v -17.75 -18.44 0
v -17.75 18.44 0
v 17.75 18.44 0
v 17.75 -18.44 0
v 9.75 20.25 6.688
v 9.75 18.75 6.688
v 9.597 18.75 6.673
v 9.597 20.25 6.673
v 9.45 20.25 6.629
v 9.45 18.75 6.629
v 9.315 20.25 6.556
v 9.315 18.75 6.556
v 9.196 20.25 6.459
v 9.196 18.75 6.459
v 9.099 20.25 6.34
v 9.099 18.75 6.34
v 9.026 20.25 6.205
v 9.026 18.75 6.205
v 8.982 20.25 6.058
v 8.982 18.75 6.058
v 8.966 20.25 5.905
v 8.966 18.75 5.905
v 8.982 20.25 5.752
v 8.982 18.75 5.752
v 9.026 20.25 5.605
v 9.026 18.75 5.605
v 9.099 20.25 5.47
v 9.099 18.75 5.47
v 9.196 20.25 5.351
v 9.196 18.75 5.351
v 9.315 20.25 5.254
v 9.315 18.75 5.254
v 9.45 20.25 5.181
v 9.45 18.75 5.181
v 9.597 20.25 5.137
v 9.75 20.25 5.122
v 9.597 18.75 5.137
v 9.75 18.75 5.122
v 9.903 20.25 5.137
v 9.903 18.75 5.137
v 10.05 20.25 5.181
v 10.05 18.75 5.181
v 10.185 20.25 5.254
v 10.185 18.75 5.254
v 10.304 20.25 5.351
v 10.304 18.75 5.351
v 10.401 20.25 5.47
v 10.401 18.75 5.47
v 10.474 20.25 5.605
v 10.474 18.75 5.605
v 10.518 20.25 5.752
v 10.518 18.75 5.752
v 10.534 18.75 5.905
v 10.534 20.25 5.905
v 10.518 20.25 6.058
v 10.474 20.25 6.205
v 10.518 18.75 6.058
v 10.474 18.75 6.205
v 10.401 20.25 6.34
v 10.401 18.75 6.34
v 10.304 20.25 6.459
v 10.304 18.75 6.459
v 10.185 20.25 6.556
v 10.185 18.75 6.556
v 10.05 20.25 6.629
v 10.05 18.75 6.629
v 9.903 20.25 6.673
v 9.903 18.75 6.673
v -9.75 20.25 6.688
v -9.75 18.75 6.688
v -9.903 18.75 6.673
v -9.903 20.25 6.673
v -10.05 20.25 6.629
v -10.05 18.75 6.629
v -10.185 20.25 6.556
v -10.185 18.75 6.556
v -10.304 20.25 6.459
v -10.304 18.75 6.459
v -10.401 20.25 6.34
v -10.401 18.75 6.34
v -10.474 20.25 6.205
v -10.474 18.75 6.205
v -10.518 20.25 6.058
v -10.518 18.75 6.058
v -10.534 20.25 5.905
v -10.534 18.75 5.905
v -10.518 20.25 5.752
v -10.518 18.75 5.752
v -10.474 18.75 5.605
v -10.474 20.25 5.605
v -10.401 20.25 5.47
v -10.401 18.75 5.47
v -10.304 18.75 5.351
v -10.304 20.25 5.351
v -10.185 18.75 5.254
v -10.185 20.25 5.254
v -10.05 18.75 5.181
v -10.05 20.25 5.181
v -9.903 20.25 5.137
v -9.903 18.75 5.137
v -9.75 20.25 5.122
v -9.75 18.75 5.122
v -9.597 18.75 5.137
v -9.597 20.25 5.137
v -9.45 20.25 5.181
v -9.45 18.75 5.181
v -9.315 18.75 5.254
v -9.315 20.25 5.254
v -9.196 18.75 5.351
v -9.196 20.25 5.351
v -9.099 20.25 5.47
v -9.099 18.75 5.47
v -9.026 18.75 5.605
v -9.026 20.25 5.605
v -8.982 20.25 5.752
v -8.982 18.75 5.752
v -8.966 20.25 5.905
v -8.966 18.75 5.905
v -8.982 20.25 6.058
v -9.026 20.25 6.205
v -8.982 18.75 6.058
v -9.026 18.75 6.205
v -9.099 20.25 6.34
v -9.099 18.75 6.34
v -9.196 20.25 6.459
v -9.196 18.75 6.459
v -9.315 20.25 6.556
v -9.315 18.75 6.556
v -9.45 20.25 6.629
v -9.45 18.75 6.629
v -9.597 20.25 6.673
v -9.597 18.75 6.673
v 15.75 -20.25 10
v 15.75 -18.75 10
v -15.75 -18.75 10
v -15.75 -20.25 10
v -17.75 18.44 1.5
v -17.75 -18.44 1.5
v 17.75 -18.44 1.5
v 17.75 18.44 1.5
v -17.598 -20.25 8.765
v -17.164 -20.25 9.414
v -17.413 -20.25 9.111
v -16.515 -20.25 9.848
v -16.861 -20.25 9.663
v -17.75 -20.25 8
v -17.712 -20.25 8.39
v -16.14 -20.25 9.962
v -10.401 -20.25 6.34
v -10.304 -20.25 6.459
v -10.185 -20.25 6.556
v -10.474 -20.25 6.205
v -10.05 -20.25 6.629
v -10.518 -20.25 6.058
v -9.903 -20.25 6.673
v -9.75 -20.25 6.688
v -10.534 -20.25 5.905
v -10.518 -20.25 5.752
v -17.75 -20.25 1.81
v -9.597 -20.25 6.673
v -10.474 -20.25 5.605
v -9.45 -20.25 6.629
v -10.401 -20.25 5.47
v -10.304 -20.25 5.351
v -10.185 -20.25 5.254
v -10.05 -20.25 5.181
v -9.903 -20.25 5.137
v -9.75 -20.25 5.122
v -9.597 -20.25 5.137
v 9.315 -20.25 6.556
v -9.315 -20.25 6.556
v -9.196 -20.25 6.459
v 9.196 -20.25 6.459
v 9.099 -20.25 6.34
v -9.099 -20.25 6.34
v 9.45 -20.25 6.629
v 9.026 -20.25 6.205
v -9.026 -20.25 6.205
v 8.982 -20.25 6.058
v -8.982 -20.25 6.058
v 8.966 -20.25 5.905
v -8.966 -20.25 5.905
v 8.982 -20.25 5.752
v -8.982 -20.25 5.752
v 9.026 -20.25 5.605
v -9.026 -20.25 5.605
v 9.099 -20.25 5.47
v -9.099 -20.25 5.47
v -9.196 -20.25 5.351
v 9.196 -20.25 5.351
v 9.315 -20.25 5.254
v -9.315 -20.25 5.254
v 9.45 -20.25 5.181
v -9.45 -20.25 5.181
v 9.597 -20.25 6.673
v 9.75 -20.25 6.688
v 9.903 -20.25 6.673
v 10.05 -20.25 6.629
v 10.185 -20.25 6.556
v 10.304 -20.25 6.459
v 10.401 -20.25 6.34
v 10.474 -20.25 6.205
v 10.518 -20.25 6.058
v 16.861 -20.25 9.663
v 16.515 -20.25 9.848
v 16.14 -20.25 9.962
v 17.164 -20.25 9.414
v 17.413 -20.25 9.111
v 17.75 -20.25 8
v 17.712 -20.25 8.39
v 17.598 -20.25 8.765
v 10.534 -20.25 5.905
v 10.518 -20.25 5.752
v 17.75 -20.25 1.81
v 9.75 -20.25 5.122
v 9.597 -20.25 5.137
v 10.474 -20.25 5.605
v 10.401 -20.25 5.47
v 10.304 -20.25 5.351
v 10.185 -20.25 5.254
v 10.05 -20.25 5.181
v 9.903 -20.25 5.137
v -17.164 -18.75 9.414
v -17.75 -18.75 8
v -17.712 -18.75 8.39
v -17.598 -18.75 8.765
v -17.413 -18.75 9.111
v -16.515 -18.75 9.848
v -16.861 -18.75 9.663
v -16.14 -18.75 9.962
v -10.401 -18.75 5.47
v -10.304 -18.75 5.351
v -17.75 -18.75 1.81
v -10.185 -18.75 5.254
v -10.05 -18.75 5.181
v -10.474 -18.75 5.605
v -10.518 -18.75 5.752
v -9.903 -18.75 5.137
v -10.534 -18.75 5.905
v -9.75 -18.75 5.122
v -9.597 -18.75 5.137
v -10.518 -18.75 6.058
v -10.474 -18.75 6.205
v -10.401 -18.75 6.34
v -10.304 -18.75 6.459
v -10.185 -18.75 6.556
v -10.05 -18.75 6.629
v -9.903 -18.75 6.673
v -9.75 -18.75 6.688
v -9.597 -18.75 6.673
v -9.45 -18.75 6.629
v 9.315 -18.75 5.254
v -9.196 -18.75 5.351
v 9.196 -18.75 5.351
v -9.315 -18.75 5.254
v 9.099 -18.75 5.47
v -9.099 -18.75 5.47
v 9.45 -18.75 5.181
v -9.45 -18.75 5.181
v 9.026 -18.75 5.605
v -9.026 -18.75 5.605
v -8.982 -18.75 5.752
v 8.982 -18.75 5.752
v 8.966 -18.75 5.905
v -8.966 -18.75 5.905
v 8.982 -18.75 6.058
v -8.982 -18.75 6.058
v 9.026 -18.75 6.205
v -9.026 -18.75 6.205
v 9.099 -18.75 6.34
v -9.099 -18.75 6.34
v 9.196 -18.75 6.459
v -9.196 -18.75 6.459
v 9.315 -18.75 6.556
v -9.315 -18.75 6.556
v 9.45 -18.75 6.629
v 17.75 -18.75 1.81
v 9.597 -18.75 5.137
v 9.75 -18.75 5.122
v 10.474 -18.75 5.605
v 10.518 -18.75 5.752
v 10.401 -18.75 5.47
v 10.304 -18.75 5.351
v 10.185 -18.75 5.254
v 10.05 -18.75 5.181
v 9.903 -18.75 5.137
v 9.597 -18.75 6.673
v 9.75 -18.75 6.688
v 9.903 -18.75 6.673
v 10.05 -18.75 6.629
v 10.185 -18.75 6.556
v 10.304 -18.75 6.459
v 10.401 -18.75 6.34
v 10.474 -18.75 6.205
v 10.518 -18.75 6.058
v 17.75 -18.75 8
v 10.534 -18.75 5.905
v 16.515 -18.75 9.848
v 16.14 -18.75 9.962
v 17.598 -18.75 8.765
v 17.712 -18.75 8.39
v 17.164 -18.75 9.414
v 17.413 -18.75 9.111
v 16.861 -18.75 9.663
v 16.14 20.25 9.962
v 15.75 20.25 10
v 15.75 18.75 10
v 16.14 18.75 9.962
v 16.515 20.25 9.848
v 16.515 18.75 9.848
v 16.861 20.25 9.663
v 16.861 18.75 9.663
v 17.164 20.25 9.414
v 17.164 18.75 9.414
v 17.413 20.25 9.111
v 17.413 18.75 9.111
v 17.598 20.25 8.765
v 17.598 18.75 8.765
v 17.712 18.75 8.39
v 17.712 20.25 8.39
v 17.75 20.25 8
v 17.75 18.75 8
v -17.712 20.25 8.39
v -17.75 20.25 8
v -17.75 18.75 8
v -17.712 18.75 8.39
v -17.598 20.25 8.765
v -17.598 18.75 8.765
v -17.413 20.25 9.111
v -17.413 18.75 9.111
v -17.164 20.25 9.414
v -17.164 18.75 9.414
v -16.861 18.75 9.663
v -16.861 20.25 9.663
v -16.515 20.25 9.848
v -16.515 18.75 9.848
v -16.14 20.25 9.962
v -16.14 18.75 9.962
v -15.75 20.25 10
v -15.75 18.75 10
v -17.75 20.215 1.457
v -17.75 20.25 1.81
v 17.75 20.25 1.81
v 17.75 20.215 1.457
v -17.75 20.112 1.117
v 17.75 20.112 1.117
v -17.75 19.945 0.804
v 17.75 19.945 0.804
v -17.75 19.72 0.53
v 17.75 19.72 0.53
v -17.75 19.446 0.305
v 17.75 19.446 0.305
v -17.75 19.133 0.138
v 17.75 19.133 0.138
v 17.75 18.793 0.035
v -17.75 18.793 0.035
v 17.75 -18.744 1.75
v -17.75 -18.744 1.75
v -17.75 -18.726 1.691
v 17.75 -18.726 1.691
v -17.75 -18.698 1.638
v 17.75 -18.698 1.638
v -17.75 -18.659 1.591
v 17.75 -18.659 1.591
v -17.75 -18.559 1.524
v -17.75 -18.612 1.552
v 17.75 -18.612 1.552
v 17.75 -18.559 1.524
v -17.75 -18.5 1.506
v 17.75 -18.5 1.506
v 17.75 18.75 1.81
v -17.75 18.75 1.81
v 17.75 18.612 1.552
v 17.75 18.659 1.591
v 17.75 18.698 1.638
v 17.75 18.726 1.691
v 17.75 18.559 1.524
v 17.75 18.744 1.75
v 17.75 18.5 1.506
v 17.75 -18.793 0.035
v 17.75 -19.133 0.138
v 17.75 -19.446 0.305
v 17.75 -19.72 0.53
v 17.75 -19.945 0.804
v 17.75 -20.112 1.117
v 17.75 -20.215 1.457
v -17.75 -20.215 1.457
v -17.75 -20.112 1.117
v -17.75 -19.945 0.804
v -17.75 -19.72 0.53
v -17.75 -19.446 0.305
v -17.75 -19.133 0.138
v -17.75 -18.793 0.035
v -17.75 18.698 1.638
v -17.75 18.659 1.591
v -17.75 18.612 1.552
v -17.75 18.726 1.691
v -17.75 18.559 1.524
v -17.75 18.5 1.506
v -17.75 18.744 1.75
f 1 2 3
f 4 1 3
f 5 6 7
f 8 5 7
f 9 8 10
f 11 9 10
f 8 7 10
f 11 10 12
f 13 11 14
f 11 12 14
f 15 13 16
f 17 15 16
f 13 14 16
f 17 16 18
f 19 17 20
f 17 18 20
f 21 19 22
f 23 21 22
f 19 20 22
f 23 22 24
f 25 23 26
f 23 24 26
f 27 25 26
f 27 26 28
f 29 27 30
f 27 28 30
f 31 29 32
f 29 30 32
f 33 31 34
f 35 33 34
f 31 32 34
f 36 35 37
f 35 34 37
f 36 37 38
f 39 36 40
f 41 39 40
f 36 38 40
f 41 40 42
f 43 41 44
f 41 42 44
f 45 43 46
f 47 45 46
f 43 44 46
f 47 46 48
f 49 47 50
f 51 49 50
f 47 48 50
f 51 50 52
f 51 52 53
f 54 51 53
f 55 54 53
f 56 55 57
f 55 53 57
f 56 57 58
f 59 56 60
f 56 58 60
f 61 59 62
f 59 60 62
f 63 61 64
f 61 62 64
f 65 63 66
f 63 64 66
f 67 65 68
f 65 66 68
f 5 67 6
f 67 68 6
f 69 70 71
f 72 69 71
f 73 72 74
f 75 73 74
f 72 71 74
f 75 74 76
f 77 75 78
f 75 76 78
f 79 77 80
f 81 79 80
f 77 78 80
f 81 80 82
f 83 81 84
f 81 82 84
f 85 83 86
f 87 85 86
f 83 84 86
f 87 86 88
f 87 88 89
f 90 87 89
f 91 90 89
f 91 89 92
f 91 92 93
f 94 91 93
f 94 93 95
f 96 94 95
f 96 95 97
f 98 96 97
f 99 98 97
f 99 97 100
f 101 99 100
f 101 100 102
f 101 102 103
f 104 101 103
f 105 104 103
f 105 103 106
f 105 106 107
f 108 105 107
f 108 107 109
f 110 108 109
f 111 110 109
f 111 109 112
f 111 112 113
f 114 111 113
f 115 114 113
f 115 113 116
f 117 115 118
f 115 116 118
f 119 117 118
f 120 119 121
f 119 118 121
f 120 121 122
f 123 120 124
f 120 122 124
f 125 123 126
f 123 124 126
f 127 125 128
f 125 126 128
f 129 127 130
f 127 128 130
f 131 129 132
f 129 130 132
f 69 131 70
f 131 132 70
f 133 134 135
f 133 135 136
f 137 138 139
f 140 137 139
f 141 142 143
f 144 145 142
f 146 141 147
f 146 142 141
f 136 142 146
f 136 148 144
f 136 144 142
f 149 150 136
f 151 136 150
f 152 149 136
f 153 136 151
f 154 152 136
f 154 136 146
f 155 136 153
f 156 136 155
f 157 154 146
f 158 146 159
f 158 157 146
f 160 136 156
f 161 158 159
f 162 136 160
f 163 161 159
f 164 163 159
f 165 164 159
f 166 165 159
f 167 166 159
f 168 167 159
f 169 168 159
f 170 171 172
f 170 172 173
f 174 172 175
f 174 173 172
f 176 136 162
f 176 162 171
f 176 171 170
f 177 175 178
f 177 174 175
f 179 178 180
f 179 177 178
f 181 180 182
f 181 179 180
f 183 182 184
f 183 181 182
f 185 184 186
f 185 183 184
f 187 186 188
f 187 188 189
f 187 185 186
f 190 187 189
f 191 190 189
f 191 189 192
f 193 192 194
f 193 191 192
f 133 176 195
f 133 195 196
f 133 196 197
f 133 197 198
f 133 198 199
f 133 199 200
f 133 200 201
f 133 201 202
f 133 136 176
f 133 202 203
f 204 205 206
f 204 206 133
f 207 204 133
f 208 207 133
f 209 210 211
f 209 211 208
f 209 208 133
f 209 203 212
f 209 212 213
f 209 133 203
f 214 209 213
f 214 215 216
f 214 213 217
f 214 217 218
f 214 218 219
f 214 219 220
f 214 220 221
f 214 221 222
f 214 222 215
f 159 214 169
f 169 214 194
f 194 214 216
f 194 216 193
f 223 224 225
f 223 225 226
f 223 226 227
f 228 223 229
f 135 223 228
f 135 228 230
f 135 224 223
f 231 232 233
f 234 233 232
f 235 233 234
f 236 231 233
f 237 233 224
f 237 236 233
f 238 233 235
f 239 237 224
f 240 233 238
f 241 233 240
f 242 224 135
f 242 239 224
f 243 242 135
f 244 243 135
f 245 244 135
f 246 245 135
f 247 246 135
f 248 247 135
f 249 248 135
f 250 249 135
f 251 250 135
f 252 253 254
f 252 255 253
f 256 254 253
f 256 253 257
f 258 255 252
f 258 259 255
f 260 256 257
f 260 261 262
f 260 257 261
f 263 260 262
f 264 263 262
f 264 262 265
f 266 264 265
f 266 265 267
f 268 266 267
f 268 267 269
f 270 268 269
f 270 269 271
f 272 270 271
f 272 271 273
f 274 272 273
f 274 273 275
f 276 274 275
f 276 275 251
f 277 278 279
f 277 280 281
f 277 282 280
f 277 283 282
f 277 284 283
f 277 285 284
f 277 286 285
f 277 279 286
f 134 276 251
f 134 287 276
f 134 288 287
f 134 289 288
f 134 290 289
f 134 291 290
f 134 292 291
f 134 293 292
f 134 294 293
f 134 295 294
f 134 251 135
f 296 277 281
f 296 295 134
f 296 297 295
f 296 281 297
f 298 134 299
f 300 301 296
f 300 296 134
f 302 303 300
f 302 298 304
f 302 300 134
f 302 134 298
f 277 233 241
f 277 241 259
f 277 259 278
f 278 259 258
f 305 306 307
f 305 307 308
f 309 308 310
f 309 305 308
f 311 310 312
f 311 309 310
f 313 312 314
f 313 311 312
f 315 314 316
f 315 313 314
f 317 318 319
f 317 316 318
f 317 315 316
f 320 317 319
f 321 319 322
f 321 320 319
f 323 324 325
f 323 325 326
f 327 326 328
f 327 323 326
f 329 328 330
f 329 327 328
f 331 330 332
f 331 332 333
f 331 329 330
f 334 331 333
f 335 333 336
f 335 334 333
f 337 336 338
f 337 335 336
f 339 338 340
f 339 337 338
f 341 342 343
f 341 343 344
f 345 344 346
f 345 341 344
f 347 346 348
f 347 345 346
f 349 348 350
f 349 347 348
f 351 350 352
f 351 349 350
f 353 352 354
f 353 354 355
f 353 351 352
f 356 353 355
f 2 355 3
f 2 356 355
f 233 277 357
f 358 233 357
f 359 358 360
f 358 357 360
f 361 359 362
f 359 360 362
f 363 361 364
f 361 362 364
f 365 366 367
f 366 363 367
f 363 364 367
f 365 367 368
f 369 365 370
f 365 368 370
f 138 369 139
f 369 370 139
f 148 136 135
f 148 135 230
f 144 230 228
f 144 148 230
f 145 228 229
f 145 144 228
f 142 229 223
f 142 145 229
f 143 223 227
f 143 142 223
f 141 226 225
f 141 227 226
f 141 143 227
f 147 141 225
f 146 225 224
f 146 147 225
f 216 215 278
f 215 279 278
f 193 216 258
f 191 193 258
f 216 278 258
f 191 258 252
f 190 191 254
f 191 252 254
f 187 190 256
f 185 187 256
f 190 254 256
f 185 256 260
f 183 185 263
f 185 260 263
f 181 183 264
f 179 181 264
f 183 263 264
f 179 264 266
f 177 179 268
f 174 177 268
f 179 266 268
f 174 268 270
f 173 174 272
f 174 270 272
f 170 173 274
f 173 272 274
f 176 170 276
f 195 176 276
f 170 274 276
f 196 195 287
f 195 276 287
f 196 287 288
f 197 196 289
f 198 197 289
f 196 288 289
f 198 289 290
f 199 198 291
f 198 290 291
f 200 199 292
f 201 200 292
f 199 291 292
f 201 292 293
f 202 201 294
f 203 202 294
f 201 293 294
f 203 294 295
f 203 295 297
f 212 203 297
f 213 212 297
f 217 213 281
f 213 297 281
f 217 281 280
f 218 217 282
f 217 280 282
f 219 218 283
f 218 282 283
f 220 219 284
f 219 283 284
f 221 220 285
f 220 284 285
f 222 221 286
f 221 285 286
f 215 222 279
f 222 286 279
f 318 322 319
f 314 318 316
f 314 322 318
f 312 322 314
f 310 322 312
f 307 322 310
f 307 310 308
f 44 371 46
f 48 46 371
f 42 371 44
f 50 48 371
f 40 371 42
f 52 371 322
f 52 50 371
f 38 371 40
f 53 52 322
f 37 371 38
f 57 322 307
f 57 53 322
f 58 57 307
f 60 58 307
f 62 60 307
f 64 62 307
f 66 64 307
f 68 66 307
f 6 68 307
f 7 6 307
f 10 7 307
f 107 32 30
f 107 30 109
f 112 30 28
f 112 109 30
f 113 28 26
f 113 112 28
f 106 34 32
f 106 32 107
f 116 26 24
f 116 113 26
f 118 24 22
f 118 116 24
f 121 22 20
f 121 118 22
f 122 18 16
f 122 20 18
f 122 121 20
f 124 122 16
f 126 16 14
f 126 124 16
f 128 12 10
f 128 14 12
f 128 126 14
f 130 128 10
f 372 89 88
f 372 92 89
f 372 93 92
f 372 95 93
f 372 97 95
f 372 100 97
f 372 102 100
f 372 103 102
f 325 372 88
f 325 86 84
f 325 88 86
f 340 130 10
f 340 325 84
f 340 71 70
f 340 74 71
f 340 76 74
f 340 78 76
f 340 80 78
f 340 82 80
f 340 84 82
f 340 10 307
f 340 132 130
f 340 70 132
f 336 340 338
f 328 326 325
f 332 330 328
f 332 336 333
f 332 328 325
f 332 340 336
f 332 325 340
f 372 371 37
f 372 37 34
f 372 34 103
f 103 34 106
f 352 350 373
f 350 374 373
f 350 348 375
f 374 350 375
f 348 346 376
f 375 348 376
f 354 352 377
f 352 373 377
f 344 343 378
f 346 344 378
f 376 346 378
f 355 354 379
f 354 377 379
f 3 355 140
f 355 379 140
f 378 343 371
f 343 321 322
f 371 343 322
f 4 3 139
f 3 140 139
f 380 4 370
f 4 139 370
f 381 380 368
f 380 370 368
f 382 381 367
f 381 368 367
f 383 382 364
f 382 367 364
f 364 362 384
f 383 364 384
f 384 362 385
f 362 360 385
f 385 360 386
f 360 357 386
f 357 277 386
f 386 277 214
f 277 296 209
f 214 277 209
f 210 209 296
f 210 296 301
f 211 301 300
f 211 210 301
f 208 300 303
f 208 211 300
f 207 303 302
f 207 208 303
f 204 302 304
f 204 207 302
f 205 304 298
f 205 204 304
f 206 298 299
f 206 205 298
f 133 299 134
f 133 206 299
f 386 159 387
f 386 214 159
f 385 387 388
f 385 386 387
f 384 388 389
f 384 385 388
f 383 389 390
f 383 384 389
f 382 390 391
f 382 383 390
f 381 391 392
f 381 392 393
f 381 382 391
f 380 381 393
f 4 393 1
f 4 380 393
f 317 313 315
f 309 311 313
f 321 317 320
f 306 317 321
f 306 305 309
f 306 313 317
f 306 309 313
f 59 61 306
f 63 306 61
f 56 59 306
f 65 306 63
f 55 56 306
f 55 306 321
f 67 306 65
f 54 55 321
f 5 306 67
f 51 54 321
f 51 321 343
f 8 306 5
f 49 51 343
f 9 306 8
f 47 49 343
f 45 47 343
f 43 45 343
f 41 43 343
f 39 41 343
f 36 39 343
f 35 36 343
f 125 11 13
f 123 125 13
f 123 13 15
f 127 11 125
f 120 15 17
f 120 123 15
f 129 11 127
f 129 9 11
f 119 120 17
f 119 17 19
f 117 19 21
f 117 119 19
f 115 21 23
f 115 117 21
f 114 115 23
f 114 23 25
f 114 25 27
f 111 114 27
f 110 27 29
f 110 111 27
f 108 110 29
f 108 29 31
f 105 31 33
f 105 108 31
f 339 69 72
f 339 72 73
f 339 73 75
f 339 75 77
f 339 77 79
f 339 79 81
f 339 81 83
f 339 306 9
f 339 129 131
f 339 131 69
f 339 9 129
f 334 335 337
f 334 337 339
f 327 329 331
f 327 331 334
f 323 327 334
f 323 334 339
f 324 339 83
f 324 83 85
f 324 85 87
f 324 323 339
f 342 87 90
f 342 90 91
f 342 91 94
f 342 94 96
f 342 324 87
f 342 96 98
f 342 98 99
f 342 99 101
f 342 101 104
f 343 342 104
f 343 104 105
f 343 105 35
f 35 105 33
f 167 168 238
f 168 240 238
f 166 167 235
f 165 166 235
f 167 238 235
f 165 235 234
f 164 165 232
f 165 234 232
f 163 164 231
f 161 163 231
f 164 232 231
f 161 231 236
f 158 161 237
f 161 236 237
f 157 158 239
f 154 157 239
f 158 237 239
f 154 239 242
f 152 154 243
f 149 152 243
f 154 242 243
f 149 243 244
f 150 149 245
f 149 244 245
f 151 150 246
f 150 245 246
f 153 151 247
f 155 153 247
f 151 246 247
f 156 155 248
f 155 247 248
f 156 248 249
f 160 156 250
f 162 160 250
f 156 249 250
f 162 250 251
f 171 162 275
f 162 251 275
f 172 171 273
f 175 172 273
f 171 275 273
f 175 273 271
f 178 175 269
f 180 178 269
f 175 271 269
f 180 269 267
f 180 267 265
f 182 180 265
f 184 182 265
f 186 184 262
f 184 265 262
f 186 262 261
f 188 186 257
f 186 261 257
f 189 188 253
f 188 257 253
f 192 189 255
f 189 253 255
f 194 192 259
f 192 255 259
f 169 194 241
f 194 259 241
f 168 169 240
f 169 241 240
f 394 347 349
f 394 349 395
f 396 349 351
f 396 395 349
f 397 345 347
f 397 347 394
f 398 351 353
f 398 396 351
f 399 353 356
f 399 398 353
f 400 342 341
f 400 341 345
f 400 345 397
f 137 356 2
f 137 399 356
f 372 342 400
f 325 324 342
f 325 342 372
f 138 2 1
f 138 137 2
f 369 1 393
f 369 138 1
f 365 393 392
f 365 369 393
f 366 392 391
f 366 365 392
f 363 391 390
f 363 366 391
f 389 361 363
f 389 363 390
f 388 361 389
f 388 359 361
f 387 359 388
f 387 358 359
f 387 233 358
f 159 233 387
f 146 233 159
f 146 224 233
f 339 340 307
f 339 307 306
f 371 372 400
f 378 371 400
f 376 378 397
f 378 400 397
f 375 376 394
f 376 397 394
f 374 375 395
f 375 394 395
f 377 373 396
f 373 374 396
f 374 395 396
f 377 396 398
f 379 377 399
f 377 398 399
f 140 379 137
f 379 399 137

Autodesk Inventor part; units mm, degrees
ref_plane "YZ Plane" through (0, 0, 0) normal (1, 0, 0) x (0, 1, 0)
ref_plane "XZ Plane" through (0, 0, 0) normal (0, 1, 0) x (-1, 0, 0)
ref_plane "XY Plane" through (0, 0, 0) normal (0, 0, 1) x (1, 0, 0)
sketch "Sketch1" plane through (0, 0, 0) normal (0, 0, 1) x (1, 0, 0)
  line L0 (-17.75, -20.25) -> (17.75, -20.25)
  line L1 (17.75, -20.25) -> (17.75, 20.25)
  line L2 (17.75, 20.25) -> (-17.75, 20.25)
  line L3 (-17.75, 20.25) -> (-17.75, -20.25)
  line L4 (-17.75, -20.25) -> (17.75, 20.25) construction
  line L5 (17.75, -20.25) -> (-17.75, 20.25) construction
  point P0 (0, 0)
  dimension "d0" = 35.5
  dimension "d1" = 40.5
extrude "Plate1" add sketch "Sketch1" along normal blind 1.5
sketch "Sketch2" plane through (-17.75, 18.75, 0) normal (0, 1, 0) x (-1, 0, 0)
  line L0 (-35.5, 0) -> (0, 0)
  line L1 (0, 0) -> (0, 10)
  line L2 (0, 10) -> (-35.5, 10)
  line L3 (-35.5, 10) -> (-35.5, 0)
edge flange "Flange1" height 10 angle 90 thickness 1.5 bend radius 0.31 thickness toward (0, 1, 0) relief tear relief width 1.5 relief depth 0.75 corner gap 0.31 corner form 0 edges at (0, 20.25, 1.5) (0, -20.25, 1.5) wall of the first edge with corners at (17.75, 18.75, 0) (-17.75, 18.75, 0) (-17.75, 18.75, 10) (17.75, 18.75, 10)
bend "Bend1"
corner "Corner1"
sketch "Sketch3" plane through (-17.75, 20.25, 10) normal (0, 1, 0) x (1, 0, 0)
  line L0 (35.5, 8.19) -> (0, 8.19) projected
  line L1 (0, 0) -> (0, 8.19) projected
  line L2 (35.5, 0) -> (0, 0) projected
  line L3 (35.5, 8.19) -> (35.5, 0) projected
  point P0 (17.75, 10)
  point P1 (8, 4.095)
  point P2 (27.5, 4.095)
  point P3 (0, 4.095)
  point P4 (35.5, 4.095)
  dimension "d13" = 8
  dimension "d14" = 8
hole "Hole1" at (-9.75, 20.25, 5.905) at (9.75, 20.25, 5.905) direction (0, -1, 0) diameter 1.567 depth 1.5 thread size "M2x0.4" class "6H" standard "ISO Metric profile"
sketch "Sketch4" plane through (-17.75, -20.25, 10) normal (0, -1, 0) x (1, 0, 0)
  circle A0 centre (27.5, -4.095) radius 0.7835 projected
  circle A1 centre (8, -4.095) radius 0.7835 projected
  point P0 (17.75, -10)
hole "Hole2" at (9.75, -20.25, 5.905) at (-9.75, -20.25, 5.905) direction (0, 1, 0) diameter 1.567 depth 1.5 thread size "M2x0.4" class "6H" standard "ISO Metric profile"
fillet "Corner Round1" radius 2 4 edges at (17.75, 19.5, 10) (-17.75, 19.5, 10) (17.75, -19.5, 10) (-17.75, -19.5, 10)
equation "\"d14\" = d13"
equation "\"d20\" = Thickness"
equation "\"d2\" = Thickness"
equation "\"d3\" = BendReliefWidth"
equation "\"d4\" = BendReliefDepth"
equation "\"d5\" = MinimumRemnant"
equation "\"d6\" = TransitionRadius"
equation "\"d9\" = BendRadius"
equation "\"d10\" = CornerReliefSize"
equation "\"d11\" = GapSize"
equation "\"d12\" = JacobiRadiusSize"
equation "\"BendReliefWidth\" = Thickness"
equation "\"BendReliefDepth\" = 0.5 * Thickness"
equation "\"CornerReliefSize\" = 4 * Thickness"
equation "\"MinimumRemnant\" = 2 * Thickness"
equation "\"TransitionRadius\" = BendRadius"
equation "\"JacobiRadiusSize\" = BendRadius"
equation "\"GapSize\" = Thickness"
equation "\"Thickness\" = 1.5"
equation "\"BendRadius\" = 0.31"
properties part number "ㄷ_frame_3" material "Aluminum 6061"
